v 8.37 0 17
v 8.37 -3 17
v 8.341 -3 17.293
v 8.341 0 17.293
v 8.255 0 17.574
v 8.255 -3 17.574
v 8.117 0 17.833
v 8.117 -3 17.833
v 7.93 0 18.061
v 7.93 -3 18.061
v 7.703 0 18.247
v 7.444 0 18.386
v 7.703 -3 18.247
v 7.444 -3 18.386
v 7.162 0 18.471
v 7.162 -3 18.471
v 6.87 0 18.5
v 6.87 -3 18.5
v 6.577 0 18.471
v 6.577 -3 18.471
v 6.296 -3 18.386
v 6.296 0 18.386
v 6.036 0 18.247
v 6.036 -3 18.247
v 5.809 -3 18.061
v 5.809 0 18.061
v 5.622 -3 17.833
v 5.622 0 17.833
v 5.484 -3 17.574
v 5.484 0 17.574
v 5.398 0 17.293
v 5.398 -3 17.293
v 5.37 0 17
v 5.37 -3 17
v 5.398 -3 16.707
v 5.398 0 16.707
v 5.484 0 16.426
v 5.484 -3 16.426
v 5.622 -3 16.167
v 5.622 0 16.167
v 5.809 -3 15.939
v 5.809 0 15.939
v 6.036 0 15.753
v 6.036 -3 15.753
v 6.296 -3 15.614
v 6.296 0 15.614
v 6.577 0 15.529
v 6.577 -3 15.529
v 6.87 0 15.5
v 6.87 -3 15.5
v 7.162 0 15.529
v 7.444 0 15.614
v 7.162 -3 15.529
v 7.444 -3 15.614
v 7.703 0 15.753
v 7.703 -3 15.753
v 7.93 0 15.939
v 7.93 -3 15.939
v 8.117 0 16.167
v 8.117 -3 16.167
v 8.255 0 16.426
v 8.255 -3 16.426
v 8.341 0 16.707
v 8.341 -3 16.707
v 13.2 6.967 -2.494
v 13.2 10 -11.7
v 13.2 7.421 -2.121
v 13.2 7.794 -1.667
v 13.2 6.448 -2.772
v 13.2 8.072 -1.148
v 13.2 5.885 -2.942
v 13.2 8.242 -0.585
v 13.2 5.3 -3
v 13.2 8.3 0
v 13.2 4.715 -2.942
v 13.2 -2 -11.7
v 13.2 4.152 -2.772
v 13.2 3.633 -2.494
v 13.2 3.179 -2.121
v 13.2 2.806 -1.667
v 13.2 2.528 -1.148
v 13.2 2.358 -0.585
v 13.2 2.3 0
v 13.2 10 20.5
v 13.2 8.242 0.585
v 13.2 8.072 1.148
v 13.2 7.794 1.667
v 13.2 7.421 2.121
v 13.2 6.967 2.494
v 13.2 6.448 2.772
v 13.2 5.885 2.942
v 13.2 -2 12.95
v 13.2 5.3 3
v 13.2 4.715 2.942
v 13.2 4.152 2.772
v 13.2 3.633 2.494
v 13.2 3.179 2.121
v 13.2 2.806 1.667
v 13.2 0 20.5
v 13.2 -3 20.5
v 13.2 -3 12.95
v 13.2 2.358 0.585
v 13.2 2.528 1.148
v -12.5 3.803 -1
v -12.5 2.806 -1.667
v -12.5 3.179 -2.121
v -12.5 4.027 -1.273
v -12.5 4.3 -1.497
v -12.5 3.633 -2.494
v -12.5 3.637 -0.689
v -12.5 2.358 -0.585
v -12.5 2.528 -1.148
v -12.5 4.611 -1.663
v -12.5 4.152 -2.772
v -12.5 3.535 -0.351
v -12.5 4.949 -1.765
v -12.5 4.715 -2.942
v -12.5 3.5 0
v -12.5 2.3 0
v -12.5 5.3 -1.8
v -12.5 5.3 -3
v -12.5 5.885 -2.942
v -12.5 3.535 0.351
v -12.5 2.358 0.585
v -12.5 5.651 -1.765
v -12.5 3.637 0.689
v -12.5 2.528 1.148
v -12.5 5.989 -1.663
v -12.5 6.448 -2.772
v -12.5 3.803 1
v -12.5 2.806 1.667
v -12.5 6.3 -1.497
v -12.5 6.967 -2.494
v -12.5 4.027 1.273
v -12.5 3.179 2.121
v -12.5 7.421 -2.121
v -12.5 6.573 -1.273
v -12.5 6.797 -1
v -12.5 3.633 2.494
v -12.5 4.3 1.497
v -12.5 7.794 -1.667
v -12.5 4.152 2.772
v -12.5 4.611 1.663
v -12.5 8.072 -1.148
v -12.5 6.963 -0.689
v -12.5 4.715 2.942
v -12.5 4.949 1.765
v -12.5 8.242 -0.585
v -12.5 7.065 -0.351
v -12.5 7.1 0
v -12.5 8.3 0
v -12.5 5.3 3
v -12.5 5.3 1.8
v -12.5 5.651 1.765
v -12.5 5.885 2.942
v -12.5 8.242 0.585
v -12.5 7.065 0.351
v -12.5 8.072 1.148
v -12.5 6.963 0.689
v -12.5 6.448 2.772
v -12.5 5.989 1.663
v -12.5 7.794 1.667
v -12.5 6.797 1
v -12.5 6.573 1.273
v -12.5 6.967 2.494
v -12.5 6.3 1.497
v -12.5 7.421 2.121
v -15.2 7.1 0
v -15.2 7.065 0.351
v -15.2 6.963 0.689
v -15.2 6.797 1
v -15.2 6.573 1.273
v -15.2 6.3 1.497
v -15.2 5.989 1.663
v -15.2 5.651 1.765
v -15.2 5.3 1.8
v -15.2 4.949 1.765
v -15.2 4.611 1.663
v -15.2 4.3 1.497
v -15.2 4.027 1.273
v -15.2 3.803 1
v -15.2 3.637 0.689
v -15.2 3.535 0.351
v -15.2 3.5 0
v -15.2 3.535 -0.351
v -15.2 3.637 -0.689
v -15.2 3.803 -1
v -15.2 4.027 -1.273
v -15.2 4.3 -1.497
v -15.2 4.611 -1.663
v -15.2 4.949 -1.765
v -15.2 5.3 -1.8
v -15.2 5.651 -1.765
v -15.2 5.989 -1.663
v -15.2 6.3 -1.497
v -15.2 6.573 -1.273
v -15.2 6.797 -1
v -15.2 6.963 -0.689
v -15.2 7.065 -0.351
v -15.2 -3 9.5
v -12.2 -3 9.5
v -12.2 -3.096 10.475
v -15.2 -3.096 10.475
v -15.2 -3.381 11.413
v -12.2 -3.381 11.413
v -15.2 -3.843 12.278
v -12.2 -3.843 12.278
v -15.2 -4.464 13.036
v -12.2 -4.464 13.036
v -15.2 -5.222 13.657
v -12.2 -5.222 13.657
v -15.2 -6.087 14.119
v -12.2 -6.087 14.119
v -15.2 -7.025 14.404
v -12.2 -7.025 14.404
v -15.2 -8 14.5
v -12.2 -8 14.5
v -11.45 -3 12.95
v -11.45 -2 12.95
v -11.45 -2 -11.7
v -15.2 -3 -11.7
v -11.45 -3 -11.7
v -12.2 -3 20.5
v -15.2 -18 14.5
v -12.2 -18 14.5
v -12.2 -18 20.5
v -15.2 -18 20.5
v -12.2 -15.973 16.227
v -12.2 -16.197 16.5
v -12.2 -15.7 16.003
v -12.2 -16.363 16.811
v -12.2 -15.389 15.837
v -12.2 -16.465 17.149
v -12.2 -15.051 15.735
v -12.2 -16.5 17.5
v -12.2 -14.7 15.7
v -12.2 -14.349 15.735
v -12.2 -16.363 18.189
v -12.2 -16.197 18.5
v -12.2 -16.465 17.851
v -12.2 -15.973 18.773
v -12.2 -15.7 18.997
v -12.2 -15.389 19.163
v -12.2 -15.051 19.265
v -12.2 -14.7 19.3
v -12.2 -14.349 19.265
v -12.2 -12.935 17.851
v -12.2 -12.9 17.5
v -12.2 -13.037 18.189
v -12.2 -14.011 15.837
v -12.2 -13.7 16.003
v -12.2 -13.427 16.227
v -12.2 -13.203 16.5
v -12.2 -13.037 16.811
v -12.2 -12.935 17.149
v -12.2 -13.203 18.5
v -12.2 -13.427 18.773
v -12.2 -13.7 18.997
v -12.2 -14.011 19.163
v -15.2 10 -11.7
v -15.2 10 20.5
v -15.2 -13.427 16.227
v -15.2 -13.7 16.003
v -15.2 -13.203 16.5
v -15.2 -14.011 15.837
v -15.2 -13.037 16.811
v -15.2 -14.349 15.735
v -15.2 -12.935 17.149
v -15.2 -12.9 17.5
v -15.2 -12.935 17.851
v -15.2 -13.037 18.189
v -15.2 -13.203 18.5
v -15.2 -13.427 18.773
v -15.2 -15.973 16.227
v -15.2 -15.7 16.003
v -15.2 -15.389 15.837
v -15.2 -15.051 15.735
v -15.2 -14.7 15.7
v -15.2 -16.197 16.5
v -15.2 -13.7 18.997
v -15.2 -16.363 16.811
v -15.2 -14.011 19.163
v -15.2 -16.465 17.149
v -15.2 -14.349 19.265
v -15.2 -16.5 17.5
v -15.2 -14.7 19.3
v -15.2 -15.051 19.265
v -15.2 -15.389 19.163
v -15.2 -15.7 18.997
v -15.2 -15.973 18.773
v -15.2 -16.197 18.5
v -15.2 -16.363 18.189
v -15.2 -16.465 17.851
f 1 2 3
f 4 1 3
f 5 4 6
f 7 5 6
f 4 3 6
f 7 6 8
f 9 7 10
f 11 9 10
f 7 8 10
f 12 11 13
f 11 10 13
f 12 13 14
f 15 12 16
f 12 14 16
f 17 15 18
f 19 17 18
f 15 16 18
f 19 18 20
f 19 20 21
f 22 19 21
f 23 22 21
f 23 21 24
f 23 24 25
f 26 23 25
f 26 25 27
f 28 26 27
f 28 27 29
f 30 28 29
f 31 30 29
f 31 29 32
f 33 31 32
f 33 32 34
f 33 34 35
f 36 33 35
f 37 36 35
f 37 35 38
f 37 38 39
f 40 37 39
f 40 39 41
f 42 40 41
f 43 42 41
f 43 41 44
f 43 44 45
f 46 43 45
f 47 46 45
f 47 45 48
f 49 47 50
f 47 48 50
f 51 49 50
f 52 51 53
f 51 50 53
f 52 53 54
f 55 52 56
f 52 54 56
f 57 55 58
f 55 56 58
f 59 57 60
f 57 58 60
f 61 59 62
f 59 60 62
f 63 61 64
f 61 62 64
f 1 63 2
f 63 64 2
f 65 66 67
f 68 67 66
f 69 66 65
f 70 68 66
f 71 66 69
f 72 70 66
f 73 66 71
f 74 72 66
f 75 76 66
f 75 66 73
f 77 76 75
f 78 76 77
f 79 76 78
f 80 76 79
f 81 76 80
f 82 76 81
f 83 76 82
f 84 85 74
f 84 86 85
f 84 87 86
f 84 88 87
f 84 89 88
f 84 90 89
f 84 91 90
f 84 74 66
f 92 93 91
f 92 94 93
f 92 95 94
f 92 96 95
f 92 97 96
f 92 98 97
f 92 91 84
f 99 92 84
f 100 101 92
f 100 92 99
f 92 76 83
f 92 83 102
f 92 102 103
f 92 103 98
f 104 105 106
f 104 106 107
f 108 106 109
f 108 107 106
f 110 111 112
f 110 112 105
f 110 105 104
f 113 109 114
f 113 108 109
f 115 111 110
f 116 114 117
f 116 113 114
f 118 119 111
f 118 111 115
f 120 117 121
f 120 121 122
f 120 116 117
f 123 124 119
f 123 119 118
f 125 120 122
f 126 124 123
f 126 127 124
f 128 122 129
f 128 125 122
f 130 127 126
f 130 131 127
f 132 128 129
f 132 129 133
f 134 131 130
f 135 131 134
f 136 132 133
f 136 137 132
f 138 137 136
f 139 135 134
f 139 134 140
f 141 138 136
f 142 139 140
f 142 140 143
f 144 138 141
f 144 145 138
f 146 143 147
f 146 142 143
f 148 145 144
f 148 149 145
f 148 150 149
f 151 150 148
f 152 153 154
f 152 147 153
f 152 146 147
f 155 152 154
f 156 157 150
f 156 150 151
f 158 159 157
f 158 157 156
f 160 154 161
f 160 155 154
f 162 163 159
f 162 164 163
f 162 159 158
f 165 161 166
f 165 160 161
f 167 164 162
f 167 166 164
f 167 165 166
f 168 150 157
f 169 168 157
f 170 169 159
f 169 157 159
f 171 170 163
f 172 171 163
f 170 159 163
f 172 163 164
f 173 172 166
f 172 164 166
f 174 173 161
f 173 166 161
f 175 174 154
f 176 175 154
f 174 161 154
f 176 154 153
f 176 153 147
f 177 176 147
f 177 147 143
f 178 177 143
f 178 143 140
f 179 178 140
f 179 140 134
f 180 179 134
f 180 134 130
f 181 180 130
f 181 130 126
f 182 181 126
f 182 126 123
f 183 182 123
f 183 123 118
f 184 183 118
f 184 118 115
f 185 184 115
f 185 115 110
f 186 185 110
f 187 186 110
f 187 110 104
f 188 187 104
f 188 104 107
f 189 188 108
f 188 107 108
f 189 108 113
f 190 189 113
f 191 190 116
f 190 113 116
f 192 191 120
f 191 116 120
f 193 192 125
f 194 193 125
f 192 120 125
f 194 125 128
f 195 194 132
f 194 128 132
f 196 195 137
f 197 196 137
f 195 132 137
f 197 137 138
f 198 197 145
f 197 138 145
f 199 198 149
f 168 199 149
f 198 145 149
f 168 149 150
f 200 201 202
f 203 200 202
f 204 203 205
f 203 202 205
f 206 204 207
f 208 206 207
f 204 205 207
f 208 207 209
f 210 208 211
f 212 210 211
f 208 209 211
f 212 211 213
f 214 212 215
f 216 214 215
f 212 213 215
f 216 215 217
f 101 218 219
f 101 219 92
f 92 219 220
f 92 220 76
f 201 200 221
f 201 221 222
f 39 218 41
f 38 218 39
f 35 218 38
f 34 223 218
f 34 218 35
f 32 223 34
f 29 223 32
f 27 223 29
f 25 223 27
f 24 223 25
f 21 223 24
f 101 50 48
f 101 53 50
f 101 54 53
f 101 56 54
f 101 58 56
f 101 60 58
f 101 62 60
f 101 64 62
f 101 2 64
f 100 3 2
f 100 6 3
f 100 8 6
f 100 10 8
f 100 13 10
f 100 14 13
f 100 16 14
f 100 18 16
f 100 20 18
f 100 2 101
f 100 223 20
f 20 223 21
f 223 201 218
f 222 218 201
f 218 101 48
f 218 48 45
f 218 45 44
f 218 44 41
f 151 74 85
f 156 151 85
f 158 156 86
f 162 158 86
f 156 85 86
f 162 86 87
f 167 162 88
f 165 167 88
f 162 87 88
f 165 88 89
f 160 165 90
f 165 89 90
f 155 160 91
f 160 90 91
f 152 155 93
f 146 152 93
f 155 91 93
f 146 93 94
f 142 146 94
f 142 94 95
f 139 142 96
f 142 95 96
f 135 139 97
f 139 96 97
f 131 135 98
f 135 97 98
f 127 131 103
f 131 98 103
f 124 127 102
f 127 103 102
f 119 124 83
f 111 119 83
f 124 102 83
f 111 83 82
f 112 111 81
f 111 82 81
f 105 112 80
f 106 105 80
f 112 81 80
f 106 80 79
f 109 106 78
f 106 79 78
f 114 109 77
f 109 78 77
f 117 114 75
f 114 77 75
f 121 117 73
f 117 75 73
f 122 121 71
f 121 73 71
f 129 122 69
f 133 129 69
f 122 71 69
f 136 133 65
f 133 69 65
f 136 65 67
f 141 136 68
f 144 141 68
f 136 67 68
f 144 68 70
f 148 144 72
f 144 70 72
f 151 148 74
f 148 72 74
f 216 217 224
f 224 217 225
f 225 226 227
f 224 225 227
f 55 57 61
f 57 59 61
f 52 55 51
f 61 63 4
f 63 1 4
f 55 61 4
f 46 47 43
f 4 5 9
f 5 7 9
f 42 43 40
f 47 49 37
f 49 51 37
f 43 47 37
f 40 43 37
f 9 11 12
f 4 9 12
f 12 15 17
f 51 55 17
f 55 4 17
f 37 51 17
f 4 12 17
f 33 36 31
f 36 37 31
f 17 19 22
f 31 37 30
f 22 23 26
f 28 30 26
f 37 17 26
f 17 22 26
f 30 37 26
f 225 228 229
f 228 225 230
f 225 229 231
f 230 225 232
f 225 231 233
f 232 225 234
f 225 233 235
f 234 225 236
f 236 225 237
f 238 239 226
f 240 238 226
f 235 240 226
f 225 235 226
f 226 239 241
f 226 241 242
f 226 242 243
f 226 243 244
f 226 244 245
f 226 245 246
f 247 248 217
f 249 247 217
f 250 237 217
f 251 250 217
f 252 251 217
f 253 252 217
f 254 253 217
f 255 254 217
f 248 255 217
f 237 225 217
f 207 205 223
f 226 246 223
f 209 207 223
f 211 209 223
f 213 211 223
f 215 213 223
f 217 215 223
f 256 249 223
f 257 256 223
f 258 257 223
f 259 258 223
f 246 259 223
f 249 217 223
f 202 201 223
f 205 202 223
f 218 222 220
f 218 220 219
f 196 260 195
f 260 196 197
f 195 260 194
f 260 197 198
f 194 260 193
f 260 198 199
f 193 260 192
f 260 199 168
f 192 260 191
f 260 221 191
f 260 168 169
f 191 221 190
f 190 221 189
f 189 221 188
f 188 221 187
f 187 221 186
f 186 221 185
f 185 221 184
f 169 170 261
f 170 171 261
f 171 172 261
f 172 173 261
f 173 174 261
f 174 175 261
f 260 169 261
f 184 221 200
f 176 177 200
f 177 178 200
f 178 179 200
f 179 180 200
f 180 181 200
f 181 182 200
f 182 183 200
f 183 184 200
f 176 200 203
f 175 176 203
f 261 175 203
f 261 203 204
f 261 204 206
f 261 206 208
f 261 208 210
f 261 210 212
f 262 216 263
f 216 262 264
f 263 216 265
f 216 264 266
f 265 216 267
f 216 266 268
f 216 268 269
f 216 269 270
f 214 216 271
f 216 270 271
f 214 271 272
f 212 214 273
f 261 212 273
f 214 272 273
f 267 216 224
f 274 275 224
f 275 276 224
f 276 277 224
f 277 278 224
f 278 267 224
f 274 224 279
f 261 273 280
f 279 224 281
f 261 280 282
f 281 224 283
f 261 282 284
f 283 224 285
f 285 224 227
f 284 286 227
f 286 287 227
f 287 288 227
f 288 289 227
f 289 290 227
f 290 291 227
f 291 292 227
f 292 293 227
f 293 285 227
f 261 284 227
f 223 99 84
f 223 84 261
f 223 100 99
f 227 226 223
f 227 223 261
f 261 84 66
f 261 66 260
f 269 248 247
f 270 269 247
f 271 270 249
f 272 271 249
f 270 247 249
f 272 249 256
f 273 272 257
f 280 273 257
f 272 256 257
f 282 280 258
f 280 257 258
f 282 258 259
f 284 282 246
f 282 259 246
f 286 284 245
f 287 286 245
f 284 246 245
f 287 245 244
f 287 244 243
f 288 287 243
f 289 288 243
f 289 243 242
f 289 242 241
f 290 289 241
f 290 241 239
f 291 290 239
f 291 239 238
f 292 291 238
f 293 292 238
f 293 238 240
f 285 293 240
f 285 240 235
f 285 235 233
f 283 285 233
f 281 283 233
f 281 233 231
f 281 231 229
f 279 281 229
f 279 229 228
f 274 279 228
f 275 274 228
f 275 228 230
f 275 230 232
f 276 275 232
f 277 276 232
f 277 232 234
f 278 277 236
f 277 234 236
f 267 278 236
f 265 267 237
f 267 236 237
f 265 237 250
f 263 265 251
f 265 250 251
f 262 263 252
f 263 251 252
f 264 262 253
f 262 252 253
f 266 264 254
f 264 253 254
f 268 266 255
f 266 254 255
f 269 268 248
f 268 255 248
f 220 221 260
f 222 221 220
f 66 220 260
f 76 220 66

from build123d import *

# Parameters (mm, degrees)
F0_W      = 30.4
F0_H      = 27.4
F1_DEPTH  = 3
F2_W      = 25.9
F2_H      = 25.9
F3_DEPTH  = 1
F4_W      = 3
F4_H      = 41
F5_DEPTH  = 18
F7_DEPTH  = 25
F8_R      = 1.8
F9_DEPTH  = 25
F10_W     = 27.4
F10_H     = 6.8
F11_DEPTH = 3
F12_R     = 1.5
F13_DEPTH = 3.001
F14_W     = 8.9006384343
F14_H     = 16.5555408895
F15_DEPTH = 25
F16_W     = 9.1082898408
F16_H     = 12.178418237
F17_DEPTH = 25
F18_W     = 2
F18_H     = 37.0905021131
F19_DEPTH = 25
F20_W     = 28.4
F20_H     = 34.2
F21_DEPTH = 10
F22_R     = 1.8
F23_DEPTH = 38.7
F24_R     = 3
F25_DEPTH = 25.7
F26_W     = 25.8796279177
F26_H     = 5.8478018075
F27_DEPTH = 1
F28_W     = 61.7600152118
F28_H     = 2
F29_DEPTH = 25


with BuildPart() as f1:
    # F0 (on Front) → F1 (new body)
    with BuildSketch(Plane.XZ):
        Rectangle(F0_W, F0_H)
    extrude(amount=F1_DEPTH)

    # F2 (on face) → F3 (cut)
    with BuildSketch(Plane.XZ.offset(3)):
        with Locations((1.5, 0)):
            Rectangle(F2_W, F2_H)
    extrude(amount=-F3_DEPTH, mode=Mode.SUBTRACT)

    # F4 (on face) → F5 (join)
    with BuildSketch(Plane(origin=(0, 0, 0), x_dir=(-1, 0, 0), z_dir=(0, 1, 0))):
        with Locations((13.7, 0)):
            Rectangle(F4_W, F4_H)
    extrude(amount=-F5_DEPTH)

    # F6 (on face) → F7 (cut)
    with BuildSketch(Plane.YZ.offset(-12.2)):
        with BuildLine():
            Line((-18, 14.5), (-18, -14.5))
            Line((-18, -14.5), (-8, -14.5))
            ThreePointArc((-8, -14.5), (-4.4644660941, -13.0355339059), (-3, -9.5))
            Line((-3, -9.5), (-3, 9.5))
            ThreePointArc((-3, 9.5), (-4.4644660941, 13.0355339059), (-8, 14.5))
            Line((-8, 14.5), (-18, 14.5))
        make_face()
    extrude(amount=-F7_DEPTH, mode=Mode.SUBTRACT)

    # F8 (on face) → F9 (cut)
    with BuildSketch(Plane.YZ.offset(-12.2)):
        with Locations((-14.7, -17.5)):
            Circle(F8_R)
        with Locations((-14.7, 17.5)):
            Circle(F8_R)
    extrude(amount=-F9_DEPTH, mode=Mode.SUBTRACT)

    # F10 (on Front) → F11 (join)
    with BuildSketch(Plane.XZ):
        with Locations((1.5, 17.1)):
            Rectangle(F10_W, F10_H)
    extrude(amount=F11_DEPTH)

    # F12 (on face) → F13 (cut, through all)
    with BuildSketch(Plane.XZ.offset(3)):
        with Locations((6.8696663434, 17)):
            Circle(F12_R)
    extrude(amount=-F13_DEPTH, mode=Mode.SUBTRACT)

    # F14 (on face) → F15 (cut)
    with BuildSketch(Plane.XZ.offset(3)):
        with Locations((-16.6503192171, -17.7777704448)):
            Rectangle(F14_W, F14_H)
    extrude(amount=F15_DEPTH, mode=Mode.SUBTRACT)

    # F16 (on face) → F17 (cut)
    with BuildSketch(Plane.XZ.offset(3)):
        with Locations((-16.7541449204, -19.7892091185)):
            Rectangle(F16_W, F16_H)
    extrude(amount=-F17_DEPTH, mode=Mode.SUBTRACT)

    # F18 (on face) → F19 (cut)
    with BuildSketch(Plane.XZ.offset(3)):
        with Locations((14.2, 1.9547489434)):
            Rectangle(F18_W, F18_H)
    extrude(amount=-F19_DEPTH, mode=Mode.SUBTRACT)

    # F20 (on face) → F21 (join)
    with BuildSketch(Plane(origin=(0, 0, 0), x_dir=(-1, 0, 0), z_dir=(0, 1, 0))):
        with Locations((1, 3.4)):
            Rectangle(F20_W, F20_H)
    extrude(amount=F21_DEPTH)

    # F22 (on face) → F23 (cut)
    with BuildSketch(Plane.YZ.offset(13.2)):
        with Locations((5.3, 0)):
            Circle(F22_R)
    extrude(amount=-F23_DEPTH, mode=Mode.SUBTRACT)

    # F24 (on face) → F25 (cut)
    with BuildSketch(Plane.YZ.offset(13.2)):
        with Locations((5.3, 0)):
            Circle(F24_R)
    extrude(amount=-F25_DEPTH, mode=Mode.SUBTRACT)

    # F26 (on face) → F27 (cut)
    with BuildSketch(Plane.XZ.offset(3)):
        with Locations((1.4898139589, -15.8739009038)):
            Rectangle(F26_W, F26_H)
    extrude(amount=-F27_DEPTH, mode=Mode.SUBTRACT)

    # F28 (on face) → F29 (cut)
    with BuildSketch(Plane.XZ.offset(3)):
        with Locations((15.6800076059, -12.7)):
            Rectangle(F28_W, F28_H)
    extrude(amount=-F29_DEPTH, mode=Mode.SUBTRACT)


solid = f1.part
